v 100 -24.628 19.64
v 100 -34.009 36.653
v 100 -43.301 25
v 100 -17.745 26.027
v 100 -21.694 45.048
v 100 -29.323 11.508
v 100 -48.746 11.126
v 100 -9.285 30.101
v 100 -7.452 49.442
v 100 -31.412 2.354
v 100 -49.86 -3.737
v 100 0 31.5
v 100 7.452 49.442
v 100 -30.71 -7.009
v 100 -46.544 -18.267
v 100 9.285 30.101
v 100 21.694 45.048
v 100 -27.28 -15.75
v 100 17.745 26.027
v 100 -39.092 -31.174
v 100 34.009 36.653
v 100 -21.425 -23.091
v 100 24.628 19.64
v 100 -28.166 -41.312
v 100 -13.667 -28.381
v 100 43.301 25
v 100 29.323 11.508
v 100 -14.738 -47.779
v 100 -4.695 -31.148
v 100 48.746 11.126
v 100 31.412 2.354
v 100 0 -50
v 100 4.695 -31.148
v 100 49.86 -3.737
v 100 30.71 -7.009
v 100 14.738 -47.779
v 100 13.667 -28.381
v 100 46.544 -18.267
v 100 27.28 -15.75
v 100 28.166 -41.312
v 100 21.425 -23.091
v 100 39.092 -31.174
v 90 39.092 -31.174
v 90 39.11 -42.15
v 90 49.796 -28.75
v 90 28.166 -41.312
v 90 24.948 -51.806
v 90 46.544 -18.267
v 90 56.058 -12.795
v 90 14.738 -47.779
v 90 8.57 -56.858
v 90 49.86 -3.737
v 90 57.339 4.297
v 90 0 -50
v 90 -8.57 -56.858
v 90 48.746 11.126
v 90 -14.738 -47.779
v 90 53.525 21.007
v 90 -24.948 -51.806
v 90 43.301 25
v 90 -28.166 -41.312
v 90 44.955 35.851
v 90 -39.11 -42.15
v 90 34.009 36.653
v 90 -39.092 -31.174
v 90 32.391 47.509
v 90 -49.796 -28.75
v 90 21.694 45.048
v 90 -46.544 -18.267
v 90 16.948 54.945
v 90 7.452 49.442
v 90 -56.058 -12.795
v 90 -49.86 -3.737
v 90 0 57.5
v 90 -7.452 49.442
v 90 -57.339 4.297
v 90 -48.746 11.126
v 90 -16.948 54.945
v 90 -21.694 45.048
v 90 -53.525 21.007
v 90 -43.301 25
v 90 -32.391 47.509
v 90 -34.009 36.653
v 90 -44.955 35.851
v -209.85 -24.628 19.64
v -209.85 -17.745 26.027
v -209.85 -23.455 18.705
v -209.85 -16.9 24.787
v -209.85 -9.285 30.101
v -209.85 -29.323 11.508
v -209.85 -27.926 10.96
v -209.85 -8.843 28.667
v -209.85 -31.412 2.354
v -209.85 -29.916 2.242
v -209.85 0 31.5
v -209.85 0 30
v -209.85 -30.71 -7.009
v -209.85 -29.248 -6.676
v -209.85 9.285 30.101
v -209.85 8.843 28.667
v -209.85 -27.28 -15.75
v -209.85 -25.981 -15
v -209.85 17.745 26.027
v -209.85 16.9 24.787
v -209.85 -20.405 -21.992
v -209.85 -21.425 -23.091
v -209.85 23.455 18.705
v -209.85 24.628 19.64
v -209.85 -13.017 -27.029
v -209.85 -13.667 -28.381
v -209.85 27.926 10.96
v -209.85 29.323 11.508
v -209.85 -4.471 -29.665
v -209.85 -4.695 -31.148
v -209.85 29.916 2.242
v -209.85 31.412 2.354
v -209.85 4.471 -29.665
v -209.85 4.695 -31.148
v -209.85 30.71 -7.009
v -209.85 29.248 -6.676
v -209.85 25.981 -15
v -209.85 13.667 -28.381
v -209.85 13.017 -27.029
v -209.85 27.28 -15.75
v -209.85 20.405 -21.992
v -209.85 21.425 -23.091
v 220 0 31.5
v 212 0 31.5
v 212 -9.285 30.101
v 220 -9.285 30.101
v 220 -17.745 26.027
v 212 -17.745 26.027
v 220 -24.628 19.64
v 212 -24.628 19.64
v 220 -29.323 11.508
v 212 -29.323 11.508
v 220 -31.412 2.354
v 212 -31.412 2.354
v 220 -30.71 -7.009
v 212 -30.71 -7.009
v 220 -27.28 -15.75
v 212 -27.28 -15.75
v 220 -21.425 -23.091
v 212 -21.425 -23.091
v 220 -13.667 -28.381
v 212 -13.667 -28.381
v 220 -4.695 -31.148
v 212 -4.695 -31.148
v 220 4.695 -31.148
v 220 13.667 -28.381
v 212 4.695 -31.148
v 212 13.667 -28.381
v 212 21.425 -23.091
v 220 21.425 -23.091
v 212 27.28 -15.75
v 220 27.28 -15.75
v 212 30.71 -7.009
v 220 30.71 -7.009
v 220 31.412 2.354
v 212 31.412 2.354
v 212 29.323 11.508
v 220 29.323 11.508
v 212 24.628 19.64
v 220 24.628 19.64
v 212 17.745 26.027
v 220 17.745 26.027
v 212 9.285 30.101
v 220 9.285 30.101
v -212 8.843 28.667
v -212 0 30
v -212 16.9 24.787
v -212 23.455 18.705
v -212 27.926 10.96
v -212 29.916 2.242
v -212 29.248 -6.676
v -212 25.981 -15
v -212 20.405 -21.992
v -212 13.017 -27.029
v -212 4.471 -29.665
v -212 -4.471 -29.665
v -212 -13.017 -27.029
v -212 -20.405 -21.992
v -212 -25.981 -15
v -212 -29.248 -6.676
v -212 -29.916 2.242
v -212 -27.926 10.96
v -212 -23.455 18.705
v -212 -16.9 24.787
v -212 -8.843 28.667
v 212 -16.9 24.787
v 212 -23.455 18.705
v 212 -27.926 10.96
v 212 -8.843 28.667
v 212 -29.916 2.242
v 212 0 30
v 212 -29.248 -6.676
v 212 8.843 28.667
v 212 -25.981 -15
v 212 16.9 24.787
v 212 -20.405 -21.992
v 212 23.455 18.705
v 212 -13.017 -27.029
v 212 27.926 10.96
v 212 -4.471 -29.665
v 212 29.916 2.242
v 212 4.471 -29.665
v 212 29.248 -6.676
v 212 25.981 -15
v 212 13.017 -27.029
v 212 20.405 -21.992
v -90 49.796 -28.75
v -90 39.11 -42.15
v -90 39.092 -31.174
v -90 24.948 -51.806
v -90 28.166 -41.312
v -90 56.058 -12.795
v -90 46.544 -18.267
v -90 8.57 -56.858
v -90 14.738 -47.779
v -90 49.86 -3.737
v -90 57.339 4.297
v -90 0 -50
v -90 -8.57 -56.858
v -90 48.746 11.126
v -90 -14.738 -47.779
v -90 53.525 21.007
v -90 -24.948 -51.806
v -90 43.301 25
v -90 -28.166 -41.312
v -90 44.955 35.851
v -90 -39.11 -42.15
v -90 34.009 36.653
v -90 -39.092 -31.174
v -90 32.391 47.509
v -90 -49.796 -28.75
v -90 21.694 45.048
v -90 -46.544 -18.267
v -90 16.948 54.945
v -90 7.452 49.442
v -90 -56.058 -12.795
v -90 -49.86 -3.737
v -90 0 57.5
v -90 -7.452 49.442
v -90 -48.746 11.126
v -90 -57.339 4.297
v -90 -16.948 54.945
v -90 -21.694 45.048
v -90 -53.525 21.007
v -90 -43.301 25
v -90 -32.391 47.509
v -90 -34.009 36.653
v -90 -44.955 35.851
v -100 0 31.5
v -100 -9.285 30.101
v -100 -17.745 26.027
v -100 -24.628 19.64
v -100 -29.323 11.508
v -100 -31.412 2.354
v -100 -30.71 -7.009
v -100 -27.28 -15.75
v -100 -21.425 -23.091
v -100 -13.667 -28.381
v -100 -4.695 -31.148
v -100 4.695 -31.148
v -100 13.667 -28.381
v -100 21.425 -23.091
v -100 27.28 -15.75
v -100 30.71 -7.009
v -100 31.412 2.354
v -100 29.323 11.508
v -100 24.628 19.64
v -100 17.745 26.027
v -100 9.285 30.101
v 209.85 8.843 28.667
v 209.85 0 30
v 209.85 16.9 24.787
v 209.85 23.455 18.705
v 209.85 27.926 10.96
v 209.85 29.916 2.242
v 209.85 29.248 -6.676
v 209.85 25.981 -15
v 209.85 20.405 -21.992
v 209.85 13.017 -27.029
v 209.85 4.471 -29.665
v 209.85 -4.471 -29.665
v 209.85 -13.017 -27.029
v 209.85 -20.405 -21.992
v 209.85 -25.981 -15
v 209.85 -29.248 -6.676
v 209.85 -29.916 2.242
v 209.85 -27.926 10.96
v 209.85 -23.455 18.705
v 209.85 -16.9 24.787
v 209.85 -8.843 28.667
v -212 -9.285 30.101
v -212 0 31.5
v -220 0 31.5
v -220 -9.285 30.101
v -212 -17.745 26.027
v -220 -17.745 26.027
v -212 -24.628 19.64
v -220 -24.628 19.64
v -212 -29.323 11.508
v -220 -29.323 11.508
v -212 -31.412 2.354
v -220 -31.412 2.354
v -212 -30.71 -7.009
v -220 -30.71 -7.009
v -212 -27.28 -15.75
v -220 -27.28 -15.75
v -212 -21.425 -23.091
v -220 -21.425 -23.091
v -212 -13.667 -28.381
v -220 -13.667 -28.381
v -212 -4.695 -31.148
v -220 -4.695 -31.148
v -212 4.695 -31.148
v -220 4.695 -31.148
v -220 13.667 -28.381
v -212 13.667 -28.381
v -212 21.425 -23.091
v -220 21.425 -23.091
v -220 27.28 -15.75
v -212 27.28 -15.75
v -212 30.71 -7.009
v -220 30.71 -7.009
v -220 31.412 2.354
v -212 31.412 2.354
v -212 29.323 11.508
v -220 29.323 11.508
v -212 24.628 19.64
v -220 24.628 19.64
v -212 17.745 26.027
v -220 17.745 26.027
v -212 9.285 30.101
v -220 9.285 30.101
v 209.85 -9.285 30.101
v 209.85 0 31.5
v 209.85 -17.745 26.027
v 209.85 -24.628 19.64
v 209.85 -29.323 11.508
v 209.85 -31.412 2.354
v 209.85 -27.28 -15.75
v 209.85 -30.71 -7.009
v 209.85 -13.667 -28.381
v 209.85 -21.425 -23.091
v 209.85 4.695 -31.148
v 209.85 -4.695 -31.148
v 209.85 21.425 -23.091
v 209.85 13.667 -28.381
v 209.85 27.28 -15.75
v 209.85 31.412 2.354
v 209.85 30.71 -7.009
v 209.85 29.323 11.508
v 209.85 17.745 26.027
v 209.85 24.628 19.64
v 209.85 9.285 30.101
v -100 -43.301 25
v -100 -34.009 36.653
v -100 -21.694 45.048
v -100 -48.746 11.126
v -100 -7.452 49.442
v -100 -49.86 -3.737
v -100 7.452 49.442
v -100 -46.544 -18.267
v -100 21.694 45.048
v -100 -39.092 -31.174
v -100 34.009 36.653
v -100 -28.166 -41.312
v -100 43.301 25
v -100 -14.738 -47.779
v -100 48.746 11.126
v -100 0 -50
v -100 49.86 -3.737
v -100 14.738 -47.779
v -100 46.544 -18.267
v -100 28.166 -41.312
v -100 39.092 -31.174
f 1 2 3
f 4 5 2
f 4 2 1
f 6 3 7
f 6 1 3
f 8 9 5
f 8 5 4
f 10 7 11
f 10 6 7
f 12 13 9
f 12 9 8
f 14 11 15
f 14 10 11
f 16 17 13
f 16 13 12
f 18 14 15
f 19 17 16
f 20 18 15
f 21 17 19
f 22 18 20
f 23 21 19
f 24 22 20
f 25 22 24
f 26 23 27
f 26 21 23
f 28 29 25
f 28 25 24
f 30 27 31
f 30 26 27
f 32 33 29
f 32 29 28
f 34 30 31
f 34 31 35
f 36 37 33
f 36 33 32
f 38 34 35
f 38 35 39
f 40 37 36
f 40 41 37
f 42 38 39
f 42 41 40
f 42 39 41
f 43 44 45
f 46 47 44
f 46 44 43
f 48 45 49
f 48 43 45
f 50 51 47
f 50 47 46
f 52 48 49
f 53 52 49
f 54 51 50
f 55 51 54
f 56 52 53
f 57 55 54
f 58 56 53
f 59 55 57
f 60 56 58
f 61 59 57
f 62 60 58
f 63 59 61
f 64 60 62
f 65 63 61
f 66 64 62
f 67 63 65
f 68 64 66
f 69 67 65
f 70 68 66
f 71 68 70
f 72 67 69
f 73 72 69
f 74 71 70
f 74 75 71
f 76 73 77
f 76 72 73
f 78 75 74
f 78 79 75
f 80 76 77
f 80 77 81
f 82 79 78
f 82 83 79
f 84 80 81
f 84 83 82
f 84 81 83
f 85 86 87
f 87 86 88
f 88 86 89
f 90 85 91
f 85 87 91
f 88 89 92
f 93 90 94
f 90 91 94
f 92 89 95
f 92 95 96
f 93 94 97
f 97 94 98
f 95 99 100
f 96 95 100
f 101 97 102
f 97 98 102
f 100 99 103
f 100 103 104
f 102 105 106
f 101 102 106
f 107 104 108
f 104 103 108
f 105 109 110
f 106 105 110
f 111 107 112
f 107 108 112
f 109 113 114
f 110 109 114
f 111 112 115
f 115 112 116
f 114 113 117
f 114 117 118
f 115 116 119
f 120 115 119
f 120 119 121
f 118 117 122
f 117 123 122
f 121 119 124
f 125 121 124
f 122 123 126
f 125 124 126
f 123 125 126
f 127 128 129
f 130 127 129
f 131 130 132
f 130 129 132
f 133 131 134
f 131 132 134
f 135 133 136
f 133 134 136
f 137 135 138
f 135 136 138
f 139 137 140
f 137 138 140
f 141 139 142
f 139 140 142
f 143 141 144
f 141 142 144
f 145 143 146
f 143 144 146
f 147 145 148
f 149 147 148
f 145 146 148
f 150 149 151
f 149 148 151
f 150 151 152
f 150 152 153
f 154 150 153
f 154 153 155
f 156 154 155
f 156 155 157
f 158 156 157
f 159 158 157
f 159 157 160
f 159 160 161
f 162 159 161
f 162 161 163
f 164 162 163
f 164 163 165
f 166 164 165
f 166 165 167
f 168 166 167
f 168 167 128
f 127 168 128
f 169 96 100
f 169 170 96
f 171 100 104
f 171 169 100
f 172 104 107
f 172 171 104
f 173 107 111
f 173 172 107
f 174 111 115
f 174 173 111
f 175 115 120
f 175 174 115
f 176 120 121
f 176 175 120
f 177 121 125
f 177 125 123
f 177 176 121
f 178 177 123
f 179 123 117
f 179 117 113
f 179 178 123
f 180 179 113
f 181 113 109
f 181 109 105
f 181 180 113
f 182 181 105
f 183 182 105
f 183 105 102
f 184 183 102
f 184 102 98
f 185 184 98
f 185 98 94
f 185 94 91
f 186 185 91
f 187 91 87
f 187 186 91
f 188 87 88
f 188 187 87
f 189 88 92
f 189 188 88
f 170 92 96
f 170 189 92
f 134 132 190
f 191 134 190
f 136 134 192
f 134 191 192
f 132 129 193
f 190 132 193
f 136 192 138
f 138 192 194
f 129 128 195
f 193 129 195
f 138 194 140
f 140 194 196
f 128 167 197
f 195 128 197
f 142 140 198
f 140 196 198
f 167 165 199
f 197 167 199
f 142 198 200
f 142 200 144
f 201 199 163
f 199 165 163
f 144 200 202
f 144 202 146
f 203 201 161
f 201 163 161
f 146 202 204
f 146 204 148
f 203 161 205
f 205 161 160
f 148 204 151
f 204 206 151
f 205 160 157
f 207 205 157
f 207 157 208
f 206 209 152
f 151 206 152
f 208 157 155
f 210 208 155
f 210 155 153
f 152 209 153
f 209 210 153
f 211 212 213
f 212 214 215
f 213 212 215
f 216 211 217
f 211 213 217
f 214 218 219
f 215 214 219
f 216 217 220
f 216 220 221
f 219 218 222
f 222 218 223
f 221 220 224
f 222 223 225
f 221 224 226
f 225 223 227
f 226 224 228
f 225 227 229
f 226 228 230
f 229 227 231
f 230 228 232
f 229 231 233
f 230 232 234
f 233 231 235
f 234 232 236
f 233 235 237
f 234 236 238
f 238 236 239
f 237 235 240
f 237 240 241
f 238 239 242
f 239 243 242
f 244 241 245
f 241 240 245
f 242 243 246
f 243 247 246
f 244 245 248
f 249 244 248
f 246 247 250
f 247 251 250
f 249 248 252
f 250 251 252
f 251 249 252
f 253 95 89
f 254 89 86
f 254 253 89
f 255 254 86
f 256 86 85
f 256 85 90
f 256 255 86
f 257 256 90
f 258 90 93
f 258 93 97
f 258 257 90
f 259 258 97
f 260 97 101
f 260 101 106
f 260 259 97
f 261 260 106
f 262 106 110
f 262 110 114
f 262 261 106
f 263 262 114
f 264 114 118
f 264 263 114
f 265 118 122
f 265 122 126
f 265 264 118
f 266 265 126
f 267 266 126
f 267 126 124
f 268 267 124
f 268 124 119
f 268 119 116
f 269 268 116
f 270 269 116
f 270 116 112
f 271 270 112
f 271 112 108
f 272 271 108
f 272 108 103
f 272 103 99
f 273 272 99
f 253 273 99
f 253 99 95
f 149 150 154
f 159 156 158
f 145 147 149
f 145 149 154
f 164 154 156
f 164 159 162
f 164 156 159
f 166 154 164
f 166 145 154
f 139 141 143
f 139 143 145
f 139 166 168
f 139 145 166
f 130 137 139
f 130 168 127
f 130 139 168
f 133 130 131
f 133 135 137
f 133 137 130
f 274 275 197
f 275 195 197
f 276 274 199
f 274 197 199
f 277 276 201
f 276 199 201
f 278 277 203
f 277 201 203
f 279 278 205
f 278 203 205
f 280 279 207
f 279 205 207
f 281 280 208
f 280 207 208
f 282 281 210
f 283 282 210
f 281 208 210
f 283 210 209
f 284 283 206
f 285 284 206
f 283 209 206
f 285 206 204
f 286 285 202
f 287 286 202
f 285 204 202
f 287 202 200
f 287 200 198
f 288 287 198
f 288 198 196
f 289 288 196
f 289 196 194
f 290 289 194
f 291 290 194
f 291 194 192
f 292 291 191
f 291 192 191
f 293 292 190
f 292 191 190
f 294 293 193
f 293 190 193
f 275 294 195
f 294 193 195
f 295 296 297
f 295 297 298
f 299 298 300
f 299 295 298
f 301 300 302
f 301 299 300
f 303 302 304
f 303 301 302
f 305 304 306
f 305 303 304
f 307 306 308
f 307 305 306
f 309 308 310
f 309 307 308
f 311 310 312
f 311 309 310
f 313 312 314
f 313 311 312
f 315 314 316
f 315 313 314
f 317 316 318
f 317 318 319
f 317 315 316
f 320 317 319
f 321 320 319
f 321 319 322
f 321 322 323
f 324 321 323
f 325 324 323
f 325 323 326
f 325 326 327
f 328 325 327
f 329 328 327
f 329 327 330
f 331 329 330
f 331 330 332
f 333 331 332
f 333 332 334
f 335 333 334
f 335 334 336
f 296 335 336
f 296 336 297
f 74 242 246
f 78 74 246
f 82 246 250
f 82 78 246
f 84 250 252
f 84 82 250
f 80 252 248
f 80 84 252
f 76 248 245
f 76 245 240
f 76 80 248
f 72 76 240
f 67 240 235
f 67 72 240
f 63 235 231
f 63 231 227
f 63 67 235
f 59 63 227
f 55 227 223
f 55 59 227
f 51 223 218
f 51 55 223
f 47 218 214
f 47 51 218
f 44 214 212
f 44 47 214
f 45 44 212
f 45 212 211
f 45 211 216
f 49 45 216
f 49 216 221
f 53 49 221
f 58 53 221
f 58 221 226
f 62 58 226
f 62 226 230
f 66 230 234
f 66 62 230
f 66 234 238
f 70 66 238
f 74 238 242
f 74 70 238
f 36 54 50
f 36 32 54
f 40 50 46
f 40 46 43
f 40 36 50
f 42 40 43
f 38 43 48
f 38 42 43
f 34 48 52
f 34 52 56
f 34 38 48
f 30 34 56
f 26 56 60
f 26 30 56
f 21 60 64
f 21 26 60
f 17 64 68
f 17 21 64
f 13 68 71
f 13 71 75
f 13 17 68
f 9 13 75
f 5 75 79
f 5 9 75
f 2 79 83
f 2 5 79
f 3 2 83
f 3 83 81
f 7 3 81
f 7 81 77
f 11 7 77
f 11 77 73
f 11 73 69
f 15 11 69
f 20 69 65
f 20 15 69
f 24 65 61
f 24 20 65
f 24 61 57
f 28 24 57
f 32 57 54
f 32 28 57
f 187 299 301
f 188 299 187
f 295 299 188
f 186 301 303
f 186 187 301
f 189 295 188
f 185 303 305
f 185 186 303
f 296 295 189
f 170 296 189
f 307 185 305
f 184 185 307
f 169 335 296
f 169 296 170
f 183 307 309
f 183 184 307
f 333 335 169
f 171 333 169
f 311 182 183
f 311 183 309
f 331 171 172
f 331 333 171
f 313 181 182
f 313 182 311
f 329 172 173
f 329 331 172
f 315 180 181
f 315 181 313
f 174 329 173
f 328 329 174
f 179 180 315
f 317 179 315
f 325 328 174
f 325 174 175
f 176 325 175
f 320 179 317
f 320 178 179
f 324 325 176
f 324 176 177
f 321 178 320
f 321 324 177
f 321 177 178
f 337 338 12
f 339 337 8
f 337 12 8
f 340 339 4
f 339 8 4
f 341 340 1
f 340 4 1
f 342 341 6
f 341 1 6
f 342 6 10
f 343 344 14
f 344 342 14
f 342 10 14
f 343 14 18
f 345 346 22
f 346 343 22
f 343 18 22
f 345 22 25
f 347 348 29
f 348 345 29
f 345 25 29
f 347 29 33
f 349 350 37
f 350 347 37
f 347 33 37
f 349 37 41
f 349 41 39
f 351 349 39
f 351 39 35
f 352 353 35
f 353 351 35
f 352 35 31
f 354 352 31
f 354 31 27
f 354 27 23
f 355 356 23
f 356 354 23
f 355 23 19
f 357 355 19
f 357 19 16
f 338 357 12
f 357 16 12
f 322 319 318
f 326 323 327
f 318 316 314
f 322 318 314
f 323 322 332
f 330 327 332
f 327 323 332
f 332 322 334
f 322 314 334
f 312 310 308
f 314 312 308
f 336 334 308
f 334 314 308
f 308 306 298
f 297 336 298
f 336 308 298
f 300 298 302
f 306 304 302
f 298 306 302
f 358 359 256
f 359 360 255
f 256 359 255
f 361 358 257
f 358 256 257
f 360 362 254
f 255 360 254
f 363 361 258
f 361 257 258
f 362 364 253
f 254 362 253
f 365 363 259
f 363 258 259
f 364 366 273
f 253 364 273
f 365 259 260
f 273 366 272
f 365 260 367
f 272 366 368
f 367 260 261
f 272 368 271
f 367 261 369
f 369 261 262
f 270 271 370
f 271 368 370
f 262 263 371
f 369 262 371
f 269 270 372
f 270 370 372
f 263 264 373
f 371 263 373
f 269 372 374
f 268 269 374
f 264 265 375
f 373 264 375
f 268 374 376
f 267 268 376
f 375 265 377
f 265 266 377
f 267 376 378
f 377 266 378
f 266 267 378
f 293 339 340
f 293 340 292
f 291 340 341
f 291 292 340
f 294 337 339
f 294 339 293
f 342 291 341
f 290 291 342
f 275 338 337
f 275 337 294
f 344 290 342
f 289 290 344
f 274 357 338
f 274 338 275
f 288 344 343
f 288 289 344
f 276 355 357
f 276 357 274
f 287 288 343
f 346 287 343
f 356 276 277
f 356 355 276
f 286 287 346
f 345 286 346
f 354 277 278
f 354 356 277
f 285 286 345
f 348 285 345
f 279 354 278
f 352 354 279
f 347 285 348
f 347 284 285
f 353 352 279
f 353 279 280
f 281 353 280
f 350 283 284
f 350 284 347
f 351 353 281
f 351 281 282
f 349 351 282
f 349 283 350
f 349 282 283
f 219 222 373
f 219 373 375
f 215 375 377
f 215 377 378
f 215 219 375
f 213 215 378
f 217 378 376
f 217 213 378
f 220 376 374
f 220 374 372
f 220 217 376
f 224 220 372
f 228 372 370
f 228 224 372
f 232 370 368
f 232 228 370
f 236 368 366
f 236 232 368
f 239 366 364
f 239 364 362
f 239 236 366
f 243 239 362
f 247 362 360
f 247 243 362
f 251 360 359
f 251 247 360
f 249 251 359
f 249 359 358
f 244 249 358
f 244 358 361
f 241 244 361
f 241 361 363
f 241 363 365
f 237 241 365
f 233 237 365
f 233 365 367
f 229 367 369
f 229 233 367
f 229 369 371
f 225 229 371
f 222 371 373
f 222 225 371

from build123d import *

# Parameters (mm, degrees)
IZIM1_R                     = 50
Y_KSEKLIK_EKSTR_ZYON1_DEPTH = 100
IZIM1_3_R                   = 57.5
IZIM1_3_R_2                 = 50
Y_KSEKLIK_EKSTR_ZYON2_DEPTH = 90
IZIM11_R                    = 31.5
Y_KSEKLIK_EKSTR_ZYON7_DEPTH = 120
IZIM12_W                    = 2.15
IZIM12_H                    = 5.230498787


with BuildPart() as part:
    # Çizim1 → Yükseklik-Ekstrüzyon1 (new, symmetric)
    with BuildSketch(Plane(origin=(0, 0, 0), x_dir=(0, 0, -1), z_dir=(1, 0, 0))):
        Circle(IZIM1_R)
    extrude(amount=Y_KSEKLIK_EKSTR_ZYON1_DEPTH, both=True)

    # Çizim1<3> → Yükseklik-Ekstrüzyon2 (add, symmetric)
    with BuildSketch(Plane(origin=(0, 0, 0), x_dir=(0, 0, -1), z_dir=(1, 0, 0))):
        Circle(IZIM1_3_R)
        Circle(IZIM1_3_R_2, mode=Mode.SUBTRACT)
    extrude(amount=Y_KSEKLIK_EKSTR_ZYON2_DEPTH, both=True)

    # Çizim11 → Yükseklik-Ekstrüzyon7 (add)
    with BuildSketch(Plane(origin=(100, 0, 0), x_dir=(0, 0, -1), z_dir=(1, 0, 0))):
        Circle(IZIM11_R)
    y_kseklik_ekstr_zyon7 = extrude(amount=Y_KSEKLIK_EKSTR_ZYON7_DEPTH)

    # Çizim12 → Kes-Döndür1 (revolve, cut)
    with BuildSketch(Plane.XY):
        with Locations((210.925, 32.615249394)):
            Rectangle(IZIM12_W, IZIM12_H)
    kes_d_nd_r1 = revolve(axis=Axis((220, 0, 0), (-1, 0, 0)), mode=Mode.SUBTRACT)

    # Aynalama6: Yükseklik-Ekstrüzyon7, Kes-Döndür1 across plane
    add(y_kseklik_ekstr_zyon7.mirror(Plane(origin=(0, 0, 0), x_dir=(0, 0, 1), z_dir=(1, 0, 0))))
    add(kes_d_nd_r1.mirror(Plane(origin=(0, 0, 0), x_dir=(0, 0, 1), z_dir=(1, 0, 0))), mode=Mode.SUBTRACT)


solid = part.part
